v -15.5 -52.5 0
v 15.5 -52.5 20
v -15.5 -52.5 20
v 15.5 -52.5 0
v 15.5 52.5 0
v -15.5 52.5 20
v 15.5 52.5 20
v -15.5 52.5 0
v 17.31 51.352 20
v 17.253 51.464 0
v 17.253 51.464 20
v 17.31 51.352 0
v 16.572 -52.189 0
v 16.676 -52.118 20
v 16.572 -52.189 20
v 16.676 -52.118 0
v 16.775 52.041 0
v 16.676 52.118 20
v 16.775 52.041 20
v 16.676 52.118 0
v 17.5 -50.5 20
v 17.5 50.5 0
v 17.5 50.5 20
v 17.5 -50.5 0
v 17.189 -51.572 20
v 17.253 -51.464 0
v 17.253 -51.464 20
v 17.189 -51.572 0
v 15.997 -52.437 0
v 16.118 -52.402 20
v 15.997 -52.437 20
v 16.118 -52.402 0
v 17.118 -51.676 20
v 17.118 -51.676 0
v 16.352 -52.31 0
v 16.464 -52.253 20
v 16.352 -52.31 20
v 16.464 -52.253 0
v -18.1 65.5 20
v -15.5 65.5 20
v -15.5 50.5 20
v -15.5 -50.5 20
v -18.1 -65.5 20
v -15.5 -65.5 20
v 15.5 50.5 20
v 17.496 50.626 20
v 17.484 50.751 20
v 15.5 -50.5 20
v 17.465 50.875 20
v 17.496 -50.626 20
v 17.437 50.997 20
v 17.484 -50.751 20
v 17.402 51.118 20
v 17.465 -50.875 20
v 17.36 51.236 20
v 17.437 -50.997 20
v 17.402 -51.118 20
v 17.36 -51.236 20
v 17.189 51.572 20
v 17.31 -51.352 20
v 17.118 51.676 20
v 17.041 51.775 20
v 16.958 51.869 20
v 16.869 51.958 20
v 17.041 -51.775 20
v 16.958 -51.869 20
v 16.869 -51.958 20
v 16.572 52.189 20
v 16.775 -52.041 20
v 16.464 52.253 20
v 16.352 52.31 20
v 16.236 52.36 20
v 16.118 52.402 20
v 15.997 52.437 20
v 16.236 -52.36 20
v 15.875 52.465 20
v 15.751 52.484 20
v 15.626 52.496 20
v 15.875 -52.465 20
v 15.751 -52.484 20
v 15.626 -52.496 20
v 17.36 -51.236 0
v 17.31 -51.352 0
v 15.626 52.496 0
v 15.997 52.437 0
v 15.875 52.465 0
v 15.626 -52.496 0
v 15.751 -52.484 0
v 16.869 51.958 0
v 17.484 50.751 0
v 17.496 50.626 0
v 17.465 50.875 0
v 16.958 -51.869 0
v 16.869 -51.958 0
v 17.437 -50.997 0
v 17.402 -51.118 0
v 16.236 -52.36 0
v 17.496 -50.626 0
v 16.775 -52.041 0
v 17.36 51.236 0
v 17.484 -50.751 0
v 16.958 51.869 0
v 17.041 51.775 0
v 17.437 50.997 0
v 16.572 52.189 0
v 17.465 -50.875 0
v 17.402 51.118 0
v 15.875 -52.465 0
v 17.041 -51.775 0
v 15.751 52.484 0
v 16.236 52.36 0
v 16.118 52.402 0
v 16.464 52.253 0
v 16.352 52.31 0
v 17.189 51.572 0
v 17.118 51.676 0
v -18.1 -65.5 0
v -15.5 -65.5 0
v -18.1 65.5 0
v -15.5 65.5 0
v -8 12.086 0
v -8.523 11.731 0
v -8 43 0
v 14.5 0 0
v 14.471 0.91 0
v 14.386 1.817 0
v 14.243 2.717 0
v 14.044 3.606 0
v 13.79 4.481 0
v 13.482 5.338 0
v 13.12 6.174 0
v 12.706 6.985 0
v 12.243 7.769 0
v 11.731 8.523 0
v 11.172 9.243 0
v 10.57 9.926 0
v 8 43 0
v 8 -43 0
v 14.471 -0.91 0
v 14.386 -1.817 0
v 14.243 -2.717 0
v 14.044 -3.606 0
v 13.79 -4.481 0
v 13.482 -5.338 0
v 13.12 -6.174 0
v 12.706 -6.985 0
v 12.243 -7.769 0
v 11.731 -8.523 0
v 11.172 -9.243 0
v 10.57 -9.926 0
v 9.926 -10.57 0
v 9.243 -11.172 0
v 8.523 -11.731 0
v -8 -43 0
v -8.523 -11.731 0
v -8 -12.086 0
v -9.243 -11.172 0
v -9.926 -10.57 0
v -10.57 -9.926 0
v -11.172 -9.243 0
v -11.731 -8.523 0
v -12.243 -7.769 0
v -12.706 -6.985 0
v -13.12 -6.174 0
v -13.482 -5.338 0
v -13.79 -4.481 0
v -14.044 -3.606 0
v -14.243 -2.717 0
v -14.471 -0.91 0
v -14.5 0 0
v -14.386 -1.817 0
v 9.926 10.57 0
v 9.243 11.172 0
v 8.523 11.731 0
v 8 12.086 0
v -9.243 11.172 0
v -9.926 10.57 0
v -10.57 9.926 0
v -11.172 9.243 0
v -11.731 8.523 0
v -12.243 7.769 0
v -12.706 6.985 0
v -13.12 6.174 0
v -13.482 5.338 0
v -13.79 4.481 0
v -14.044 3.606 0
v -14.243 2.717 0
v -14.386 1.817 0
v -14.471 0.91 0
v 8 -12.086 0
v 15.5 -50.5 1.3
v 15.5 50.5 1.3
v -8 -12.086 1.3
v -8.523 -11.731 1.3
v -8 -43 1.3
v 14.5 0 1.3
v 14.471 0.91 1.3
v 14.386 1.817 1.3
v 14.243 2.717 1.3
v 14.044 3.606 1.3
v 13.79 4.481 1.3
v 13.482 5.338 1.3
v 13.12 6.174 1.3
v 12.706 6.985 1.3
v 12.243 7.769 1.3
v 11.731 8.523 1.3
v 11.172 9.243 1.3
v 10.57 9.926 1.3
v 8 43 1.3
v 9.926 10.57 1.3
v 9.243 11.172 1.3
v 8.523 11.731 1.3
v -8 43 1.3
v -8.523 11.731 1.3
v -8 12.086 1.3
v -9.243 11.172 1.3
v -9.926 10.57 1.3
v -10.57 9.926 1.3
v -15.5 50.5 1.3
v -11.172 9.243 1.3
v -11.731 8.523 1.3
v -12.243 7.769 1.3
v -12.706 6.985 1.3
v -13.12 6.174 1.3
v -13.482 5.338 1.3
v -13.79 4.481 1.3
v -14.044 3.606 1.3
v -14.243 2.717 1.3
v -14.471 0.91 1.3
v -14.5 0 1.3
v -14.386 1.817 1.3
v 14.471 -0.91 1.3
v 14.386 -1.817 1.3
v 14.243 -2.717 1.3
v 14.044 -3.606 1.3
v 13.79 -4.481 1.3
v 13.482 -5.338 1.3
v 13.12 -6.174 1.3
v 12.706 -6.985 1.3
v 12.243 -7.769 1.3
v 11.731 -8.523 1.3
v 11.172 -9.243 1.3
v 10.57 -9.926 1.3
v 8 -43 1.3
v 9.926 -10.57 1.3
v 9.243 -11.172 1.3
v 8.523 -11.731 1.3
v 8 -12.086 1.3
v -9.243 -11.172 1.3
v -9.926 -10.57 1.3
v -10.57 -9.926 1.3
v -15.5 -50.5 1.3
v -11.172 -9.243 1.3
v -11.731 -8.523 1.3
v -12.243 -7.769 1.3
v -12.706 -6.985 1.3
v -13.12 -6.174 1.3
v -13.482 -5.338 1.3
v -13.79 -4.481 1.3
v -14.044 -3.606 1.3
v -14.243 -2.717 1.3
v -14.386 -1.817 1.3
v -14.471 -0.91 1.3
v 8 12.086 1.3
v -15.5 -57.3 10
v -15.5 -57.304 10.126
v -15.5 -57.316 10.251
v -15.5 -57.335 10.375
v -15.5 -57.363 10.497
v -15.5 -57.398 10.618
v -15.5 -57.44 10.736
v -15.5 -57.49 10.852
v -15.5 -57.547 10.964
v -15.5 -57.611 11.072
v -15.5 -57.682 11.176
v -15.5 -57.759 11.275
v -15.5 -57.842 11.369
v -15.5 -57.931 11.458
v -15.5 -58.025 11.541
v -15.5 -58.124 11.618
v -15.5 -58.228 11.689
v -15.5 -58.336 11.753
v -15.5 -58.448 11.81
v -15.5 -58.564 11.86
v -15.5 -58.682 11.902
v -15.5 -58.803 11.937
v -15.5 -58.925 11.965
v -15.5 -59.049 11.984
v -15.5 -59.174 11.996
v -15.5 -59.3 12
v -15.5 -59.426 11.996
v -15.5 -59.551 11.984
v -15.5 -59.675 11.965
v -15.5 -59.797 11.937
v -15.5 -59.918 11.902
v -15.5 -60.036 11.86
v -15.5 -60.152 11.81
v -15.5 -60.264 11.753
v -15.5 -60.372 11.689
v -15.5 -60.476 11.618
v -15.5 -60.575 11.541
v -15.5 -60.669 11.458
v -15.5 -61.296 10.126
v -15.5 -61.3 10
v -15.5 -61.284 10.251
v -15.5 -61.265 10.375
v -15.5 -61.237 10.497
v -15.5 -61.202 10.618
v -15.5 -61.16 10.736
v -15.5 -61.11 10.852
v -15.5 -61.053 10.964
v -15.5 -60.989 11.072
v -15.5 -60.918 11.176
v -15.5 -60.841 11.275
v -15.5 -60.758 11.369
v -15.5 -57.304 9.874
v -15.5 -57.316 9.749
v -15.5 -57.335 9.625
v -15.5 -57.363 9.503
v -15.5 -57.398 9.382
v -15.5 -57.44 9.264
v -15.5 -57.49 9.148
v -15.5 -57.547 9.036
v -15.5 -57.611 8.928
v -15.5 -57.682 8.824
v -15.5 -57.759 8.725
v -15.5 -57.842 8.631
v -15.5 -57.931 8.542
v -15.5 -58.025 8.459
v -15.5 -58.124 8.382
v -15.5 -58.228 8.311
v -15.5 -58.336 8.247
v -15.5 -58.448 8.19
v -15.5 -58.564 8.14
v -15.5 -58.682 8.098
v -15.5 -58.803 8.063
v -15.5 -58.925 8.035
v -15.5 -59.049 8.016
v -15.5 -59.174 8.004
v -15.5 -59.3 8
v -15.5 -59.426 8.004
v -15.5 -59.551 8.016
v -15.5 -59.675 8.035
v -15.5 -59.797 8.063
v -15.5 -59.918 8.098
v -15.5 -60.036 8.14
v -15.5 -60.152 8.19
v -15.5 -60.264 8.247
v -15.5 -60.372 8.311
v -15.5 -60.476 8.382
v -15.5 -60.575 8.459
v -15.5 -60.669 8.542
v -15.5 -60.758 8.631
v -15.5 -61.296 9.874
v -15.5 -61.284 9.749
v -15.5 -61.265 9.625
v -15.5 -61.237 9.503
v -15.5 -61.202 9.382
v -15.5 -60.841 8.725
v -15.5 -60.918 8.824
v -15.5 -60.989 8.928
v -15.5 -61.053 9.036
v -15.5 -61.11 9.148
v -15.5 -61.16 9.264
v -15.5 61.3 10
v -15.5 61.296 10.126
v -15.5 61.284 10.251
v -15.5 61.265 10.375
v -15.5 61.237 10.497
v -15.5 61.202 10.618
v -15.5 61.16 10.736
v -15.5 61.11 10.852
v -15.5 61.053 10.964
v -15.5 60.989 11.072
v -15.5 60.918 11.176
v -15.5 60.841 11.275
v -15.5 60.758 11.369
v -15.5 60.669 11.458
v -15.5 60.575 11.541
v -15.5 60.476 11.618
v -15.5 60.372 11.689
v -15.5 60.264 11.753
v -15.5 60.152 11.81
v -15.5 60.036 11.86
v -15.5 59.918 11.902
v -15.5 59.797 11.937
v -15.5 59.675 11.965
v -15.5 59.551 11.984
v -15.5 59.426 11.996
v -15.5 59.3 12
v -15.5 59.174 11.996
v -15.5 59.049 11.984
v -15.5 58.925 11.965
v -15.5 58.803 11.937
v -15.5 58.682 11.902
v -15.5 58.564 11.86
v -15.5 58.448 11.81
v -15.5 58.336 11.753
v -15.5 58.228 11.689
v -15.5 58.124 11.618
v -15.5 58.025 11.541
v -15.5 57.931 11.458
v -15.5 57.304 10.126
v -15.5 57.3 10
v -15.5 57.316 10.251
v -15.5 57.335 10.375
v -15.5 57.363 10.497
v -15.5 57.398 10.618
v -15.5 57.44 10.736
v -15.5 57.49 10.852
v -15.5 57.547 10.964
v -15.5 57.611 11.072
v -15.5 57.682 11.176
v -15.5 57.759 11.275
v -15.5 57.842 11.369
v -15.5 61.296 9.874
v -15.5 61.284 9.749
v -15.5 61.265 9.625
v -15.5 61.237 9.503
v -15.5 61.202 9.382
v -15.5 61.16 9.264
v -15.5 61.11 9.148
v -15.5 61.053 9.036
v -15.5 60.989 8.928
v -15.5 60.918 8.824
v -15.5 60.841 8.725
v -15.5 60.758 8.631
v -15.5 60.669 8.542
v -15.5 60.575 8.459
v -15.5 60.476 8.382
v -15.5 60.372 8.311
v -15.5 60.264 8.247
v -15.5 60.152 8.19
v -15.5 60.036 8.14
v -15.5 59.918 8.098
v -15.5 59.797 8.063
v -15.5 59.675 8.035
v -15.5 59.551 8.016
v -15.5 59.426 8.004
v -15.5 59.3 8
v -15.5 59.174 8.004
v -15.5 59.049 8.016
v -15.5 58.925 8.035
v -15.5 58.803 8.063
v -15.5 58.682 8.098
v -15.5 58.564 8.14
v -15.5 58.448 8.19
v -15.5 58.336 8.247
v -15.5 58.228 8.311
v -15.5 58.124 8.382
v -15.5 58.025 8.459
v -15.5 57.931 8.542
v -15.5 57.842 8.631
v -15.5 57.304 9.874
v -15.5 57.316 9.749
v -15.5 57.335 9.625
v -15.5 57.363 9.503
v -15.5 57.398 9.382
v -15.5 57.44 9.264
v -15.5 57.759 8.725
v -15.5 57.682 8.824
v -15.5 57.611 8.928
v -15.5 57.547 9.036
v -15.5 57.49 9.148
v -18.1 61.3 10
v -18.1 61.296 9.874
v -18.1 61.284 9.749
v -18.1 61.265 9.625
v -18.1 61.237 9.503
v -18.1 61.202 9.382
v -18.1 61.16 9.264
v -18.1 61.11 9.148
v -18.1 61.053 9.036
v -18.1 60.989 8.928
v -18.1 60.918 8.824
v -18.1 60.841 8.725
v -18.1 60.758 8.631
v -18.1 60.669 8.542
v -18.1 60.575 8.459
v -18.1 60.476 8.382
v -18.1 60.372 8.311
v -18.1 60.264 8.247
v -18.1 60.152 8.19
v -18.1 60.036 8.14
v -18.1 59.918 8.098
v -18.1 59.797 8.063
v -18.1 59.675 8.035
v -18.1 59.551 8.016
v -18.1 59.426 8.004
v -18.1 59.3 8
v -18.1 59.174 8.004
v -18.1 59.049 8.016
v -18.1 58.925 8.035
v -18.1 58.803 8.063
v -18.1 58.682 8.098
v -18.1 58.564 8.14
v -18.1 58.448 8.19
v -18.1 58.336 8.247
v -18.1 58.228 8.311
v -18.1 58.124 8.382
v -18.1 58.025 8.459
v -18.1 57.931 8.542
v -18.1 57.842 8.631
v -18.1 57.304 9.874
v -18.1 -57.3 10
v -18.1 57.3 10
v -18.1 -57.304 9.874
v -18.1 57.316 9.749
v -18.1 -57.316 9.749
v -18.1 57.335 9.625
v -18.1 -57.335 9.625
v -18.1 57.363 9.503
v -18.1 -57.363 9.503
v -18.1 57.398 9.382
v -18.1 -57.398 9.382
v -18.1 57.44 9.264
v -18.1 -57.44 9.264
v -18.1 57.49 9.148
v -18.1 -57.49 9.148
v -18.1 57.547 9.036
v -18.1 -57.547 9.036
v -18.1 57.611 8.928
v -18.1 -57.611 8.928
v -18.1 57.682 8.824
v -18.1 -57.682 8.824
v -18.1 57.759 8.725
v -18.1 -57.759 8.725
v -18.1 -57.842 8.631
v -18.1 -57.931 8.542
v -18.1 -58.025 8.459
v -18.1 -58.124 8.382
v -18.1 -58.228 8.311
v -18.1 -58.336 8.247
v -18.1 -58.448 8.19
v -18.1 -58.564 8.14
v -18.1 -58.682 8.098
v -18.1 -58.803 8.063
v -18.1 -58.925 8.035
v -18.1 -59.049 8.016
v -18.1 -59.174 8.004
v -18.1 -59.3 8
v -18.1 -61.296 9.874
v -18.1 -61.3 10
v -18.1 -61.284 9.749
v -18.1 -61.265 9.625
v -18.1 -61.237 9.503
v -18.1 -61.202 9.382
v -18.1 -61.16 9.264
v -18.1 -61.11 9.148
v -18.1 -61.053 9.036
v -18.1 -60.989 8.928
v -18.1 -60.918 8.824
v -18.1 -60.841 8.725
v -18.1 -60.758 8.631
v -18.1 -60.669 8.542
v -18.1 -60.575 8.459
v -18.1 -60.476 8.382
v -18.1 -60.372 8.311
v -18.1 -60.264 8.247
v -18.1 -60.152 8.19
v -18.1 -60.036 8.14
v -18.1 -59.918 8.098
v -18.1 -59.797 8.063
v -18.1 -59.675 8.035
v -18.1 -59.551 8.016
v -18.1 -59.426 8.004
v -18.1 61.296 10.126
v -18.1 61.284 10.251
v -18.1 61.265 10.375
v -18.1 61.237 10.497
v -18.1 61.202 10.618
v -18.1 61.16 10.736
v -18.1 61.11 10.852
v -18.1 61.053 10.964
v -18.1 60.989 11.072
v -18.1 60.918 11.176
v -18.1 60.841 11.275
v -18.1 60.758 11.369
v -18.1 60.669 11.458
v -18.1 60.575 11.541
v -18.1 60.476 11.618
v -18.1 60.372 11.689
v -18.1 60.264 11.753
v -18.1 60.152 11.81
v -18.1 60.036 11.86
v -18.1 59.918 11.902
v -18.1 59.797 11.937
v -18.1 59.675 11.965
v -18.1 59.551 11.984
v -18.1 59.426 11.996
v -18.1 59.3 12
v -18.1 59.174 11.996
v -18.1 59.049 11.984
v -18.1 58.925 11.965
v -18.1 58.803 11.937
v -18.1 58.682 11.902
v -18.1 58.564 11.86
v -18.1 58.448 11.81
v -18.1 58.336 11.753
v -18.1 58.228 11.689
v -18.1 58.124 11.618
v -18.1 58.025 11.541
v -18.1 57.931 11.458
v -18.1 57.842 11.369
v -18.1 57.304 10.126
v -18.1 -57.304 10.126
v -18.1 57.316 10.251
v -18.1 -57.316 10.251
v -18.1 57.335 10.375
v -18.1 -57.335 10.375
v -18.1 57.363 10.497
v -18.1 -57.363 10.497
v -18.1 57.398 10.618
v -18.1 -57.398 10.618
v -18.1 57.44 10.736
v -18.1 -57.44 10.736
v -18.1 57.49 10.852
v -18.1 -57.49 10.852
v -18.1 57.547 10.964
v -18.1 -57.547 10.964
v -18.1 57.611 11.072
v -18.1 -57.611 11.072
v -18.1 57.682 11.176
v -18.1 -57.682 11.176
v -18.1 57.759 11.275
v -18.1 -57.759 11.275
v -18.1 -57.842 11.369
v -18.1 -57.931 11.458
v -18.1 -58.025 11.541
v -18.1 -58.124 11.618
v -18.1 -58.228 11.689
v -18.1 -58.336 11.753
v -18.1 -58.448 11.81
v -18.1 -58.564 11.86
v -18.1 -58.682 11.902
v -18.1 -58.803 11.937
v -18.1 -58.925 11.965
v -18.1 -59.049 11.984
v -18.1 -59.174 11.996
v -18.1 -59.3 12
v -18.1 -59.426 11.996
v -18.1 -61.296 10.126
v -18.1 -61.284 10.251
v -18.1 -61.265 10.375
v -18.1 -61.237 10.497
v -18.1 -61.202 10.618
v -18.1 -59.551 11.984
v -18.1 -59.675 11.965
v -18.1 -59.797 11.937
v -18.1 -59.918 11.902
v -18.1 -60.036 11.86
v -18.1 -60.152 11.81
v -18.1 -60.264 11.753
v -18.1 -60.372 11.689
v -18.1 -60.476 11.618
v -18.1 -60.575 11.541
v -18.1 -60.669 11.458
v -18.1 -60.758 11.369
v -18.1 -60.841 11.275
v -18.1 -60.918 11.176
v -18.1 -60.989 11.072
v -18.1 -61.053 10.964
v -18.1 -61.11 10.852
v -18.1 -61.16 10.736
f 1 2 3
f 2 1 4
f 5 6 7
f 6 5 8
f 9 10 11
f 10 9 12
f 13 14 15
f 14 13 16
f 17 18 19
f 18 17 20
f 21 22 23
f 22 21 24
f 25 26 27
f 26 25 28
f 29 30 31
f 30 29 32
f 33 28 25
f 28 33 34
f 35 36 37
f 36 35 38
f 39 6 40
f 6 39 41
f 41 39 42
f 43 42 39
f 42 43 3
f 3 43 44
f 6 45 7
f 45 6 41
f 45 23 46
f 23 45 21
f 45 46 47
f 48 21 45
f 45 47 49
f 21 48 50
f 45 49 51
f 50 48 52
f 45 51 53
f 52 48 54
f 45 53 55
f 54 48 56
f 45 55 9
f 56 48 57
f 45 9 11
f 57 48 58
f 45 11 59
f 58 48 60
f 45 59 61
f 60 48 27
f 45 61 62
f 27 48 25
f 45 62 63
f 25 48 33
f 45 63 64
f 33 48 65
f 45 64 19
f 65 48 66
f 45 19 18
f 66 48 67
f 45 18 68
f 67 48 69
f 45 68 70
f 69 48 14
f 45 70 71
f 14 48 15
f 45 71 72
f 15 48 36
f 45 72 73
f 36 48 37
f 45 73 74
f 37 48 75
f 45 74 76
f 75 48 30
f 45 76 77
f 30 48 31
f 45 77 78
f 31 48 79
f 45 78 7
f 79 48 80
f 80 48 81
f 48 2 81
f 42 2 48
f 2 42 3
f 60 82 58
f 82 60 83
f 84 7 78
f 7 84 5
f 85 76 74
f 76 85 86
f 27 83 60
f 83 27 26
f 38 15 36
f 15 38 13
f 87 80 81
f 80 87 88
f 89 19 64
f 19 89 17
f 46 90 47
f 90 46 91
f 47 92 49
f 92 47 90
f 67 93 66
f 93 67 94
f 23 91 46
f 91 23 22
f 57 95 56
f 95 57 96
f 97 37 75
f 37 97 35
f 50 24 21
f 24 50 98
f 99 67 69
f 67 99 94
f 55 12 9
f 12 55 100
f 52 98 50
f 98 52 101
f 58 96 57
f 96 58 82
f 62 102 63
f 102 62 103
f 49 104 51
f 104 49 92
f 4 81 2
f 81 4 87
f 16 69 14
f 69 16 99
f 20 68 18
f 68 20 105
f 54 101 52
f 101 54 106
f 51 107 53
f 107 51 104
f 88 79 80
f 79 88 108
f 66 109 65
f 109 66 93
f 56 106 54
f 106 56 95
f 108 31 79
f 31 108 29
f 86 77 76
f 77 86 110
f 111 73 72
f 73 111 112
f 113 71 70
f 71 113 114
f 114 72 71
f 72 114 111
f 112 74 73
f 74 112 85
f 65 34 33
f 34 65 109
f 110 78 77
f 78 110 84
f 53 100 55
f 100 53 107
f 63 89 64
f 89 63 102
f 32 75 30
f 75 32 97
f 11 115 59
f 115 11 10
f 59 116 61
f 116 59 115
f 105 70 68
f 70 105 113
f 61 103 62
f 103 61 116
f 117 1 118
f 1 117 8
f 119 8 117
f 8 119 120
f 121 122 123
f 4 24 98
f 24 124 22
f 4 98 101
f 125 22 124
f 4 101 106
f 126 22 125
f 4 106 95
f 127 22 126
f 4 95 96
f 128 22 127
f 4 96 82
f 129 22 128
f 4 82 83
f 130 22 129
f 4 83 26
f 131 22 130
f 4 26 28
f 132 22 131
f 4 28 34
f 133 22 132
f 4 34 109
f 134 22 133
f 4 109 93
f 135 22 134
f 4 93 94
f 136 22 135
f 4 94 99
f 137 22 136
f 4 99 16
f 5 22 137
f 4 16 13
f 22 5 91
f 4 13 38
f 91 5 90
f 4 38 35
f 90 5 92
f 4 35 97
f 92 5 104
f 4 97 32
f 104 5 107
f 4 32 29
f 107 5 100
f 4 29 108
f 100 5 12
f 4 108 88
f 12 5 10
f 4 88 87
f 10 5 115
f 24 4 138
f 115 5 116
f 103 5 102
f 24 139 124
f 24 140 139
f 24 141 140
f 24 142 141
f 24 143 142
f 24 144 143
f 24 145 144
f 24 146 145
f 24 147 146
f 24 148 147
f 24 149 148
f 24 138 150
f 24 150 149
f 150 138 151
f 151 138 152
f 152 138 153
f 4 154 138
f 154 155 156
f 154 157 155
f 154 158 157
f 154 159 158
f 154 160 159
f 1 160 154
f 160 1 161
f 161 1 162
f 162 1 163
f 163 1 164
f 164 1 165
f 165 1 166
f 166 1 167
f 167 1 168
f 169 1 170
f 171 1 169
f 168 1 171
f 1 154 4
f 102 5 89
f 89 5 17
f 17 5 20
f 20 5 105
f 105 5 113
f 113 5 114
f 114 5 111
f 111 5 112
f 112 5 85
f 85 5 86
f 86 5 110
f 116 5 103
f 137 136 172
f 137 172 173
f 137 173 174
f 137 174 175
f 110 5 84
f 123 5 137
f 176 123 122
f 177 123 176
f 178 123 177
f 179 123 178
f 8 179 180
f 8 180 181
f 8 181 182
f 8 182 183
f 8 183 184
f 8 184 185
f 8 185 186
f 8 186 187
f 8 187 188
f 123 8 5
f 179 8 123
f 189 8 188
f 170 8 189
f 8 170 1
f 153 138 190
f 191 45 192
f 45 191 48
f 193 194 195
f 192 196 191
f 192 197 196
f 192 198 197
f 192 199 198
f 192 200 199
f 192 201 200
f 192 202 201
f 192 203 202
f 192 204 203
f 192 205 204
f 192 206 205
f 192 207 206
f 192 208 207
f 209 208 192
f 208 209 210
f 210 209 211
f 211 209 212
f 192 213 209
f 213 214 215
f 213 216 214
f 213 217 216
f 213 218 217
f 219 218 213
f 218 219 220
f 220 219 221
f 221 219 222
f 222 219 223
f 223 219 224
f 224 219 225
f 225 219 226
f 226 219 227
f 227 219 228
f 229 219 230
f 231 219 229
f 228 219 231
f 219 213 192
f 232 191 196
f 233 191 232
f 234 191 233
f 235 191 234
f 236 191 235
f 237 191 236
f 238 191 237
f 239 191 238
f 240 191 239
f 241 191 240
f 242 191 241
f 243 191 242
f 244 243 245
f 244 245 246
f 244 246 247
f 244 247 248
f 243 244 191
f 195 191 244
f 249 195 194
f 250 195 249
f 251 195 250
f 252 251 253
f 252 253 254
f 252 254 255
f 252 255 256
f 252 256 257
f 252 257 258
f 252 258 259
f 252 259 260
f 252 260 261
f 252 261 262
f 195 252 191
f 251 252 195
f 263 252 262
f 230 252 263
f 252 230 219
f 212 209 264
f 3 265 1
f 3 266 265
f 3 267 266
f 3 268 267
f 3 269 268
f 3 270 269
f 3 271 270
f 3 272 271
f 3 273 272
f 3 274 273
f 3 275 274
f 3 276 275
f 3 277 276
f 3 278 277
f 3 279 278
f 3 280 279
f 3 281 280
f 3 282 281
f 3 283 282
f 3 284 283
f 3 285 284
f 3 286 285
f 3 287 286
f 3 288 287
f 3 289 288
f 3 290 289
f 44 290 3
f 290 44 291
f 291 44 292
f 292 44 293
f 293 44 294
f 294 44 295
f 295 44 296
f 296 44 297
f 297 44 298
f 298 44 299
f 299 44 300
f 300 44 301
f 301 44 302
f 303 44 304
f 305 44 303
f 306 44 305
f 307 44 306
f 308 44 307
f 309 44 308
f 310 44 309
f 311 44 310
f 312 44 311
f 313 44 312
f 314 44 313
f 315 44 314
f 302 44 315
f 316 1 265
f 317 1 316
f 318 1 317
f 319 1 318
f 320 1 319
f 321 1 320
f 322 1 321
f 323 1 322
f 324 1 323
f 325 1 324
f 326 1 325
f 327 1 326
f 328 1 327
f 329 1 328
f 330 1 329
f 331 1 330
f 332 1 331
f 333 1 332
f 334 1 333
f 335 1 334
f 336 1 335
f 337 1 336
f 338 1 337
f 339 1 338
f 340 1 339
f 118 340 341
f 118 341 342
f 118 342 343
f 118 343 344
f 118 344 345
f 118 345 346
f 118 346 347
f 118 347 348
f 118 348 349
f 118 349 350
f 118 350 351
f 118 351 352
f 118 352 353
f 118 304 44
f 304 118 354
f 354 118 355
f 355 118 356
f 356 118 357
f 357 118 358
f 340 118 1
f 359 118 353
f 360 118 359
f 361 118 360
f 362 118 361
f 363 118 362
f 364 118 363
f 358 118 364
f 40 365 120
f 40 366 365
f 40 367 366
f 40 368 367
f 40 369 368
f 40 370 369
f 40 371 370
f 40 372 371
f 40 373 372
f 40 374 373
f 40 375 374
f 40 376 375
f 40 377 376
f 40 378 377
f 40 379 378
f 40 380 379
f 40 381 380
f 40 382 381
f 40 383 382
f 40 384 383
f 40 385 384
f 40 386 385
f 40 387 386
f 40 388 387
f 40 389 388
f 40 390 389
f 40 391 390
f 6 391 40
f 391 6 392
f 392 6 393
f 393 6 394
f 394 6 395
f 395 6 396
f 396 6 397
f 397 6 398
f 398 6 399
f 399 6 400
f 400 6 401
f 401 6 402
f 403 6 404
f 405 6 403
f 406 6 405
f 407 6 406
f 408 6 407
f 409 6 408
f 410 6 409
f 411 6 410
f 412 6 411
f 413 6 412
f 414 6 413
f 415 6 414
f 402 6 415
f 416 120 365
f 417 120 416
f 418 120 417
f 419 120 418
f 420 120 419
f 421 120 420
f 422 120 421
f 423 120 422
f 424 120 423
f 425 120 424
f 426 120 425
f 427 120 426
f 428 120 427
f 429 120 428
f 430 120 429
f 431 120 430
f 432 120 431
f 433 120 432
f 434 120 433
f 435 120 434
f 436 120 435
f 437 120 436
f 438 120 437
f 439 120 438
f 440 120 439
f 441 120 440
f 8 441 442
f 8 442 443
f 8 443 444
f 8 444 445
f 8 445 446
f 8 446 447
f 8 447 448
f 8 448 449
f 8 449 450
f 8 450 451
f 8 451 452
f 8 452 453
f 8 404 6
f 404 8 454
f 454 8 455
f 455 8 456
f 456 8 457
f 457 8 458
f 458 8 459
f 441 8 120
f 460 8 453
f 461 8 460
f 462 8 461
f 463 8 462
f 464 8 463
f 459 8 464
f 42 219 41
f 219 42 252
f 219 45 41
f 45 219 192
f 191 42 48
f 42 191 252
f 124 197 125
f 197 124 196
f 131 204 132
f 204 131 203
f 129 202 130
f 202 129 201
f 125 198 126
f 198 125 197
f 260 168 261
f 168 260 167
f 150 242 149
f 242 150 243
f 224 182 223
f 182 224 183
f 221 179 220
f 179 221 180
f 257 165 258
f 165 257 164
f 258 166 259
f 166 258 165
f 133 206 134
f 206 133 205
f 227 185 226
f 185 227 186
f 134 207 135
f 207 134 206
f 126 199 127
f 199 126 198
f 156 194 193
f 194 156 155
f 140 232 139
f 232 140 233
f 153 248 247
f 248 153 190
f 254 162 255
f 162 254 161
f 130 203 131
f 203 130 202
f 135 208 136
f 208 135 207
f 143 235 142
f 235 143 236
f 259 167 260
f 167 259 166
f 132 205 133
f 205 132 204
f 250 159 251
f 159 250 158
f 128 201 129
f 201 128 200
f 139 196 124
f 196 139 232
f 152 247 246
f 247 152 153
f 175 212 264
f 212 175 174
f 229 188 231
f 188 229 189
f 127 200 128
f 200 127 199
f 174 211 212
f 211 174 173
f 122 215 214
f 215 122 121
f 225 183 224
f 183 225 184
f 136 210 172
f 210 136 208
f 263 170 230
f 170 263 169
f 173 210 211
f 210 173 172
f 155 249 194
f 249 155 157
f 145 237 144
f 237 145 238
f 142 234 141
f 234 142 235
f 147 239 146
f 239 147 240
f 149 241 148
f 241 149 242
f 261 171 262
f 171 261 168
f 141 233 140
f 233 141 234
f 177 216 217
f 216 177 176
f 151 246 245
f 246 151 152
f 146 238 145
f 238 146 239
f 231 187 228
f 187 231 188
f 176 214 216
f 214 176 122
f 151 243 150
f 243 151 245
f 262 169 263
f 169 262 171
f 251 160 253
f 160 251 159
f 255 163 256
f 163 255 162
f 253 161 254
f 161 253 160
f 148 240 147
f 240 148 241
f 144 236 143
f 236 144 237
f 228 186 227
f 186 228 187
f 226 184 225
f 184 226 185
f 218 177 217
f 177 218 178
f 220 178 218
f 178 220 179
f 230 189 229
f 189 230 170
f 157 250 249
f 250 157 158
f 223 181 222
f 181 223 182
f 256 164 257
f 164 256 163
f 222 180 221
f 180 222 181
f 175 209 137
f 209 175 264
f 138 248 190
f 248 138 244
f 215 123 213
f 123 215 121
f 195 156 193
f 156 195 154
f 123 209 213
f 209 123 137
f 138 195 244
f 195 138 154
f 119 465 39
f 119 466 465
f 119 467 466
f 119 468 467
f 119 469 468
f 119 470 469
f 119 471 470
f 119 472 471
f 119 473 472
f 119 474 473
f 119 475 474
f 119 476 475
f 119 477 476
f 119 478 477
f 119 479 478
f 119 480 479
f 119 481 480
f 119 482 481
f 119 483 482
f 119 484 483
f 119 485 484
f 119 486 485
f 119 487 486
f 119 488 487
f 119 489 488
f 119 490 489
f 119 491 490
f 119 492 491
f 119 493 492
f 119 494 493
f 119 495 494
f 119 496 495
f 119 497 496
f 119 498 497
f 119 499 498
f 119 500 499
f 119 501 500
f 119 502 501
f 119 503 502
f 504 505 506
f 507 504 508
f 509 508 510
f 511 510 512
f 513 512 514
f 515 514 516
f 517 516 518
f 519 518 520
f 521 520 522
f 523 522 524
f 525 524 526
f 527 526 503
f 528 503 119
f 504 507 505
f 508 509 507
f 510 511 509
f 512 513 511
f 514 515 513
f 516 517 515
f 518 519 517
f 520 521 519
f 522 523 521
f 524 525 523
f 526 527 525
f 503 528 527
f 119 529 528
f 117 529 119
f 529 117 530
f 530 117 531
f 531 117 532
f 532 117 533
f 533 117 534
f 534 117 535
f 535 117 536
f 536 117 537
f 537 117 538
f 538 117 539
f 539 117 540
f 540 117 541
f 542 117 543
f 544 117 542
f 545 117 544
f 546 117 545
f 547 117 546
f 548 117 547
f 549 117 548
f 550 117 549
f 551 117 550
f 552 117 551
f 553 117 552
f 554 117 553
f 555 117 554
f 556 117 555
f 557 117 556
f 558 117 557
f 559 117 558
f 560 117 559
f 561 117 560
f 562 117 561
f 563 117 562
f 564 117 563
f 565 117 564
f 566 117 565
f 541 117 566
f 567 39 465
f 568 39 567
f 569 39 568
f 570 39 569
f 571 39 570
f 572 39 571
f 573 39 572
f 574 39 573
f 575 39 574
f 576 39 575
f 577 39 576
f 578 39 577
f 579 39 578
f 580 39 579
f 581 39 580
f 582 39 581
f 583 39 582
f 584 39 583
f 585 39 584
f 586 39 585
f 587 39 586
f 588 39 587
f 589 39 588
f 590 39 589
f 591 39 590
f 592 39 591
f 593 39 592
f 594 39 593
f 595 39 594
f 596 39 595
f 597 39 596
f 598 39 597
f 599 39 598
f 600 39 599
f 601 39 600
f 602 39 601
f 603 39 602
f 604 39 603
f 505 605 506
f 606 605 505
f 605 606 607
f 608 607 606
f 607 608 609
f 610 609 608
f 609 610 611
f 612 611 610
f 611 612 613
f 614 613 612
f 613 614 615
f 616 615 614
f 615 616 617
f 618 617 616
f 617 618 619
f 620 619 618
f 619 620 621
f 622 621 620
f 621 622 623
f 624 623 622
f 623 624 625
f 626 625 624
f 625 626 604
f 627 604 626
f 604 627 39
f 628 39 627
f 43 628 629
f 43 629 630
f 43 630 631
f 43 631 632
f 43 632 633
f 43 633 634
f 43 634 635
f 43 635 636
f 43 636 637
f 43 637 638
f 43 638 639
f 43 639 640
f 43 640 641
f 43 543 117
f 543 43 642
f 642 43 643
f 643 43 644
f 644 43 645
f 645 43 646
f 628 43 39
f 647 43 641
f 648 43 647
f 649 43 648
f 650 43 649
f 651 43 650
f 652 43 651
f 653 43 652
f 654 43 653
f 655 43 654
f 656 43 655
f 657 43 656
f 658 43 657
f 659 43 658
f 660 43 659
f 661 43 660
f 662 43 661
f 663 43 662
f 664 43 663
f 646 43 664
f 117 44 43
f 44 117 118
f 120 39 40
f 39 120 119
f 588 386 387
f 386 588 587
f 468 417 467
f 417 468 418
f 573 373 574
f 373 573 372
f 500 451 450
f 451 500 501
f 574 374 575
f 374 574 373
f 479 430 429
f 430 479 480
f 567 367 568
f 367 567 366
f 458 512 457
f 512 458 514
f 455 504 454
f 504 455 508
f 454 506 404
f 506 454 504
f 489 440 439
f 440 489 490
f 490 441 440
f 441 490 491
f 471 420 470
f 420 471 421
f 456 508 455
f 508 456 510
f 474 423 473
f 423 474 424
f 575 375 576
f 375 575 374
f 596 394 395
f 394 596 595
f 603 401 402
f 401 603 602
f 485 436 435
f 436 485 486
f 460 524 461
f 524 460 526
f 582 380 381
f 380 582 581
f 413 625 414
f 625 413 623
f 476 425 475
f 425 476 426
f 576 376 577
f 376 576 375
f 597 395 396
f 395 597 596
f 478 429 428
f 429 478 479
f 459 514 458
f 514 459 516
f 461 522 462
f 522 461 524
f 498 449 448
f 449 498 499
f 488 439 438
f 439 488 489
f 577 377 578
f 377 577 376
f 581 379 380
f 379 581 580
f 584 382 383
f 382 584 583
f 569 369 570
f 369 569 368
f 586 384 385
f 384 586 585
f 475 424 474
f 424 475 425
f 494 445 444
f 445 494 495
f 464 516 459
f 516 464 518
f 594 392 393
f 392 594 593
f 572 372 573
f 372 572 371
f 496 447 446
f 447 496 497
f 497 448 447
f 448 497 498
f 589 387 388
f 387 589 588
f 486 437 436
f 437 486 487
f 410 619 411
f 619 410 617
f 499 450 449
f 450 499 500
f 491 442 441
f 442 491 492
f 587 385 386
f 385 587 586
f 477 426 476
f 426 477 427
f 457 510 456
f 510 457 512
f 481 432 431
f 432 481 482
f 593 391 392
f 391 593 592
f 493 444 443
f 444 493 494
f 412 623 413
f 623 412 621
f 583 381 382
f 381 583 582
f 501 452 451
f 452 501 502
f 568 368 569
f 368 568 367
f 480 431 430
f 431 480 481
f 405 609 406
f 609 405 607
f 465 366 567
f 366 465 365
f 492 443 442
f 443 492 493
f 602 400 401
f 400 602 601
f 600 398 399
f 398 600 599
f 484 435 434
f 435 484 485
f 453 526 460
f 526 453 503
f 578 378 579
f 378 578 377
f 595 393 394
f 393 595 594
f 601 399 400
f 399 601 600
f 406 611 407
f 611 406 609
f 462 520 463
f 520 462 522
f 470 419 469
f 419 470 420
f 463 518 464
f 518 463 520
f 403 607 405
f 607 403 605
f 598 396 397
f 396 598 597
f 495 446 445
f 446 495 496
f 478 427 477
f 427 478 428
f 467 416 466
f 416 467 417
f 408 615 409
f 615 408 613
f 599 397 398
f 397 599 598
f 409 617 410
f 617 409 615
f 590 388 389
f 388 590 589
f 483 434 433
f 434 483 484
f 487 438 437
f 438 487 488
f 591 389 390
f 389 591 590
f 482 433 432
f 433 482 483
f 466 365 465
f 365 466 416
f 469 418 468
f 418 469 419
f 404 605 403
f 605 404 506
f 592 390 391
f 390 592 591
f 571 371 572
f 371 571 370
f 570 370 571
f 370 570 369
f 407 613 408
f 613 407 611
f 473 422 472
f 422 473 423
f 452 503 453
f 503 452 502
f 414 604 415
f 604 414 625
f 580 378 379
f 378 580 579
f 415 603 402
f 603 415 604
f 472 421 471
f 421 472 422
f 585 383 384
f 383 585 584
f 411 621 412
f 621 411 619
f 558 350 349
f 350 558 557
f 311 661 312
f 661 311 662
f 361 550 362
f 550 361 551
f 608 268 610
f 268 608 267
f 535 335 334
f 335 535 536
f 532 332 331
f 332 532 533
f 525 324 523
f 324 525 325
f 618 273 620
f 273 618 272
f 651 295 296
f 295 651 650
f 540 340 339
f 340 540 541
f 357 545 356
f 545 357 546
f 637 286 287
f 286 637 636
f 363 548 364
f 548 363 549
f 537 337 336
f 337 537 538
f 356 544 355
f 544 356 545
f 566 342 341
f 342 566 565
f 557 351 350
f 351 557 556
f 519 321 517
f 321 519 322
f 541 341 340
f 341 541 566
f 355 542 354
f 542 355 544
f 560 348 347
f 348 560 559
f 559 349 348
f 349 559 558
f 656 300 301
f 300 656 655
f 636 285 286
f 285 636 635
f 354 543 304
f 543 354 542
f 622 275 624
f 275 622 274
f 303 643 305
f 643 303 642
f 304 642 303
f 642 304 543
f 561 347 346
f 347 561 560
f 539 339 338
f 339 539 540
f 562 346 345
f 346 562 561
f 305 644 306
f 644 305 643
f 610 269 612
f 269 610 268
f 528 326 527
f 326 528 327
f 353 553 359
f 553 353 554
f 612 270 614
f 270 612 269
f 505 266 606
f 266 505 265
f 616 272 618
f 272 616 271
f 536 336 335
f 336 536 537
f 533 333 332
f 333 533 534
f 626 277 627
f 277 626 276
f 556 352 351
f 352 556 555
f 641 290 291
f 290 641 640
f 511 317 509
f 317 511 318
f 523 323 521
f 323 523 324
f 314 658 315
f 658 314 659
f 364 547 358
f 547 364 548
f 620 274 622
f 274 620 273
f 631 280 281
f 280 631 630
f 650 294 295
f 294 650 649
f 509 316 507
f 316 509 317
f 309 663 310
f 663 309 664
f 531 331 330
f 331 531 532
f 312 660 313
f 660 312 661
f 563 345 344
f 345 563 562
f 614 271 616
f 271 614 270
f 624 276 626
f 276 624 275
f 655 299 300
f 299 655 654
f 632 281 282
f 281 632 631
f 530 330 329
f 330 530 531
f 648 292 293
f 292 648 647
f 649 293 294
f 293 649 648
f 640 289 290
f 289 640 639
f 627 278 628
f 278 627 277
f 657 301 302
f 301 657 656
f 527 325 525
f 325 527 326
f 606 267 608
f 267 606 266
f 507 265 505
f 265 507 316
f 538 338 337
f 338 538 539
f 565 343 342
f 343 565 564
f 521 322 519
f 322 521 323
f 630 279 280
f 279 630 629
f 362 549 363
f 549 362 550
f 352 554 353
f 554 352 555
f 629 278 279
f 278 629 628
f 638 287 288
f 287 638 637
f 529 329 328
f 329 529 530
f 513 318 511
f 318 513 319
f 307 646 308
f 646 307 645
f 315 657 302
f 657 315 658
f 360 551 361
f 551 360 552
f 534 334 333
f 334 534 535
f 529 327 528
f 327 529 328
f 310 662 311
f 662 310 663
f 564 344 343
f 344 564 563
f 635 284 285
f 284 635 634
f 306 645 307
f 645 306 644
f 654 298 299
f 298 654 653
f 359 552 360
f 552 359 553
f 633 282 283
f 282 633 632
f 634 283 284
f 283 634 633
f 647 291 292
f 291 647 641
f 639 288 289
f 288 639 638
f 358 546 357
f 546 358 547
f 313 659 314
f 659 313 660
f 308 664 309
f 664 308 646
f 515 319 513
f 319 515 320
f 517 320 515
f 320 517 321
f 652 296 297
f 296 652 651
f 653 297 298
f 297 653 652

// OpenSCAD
$fn=100;
w_border=15;
module holder(
  height=31, // the height of the powerstrip
  width=101, // the width of the powerstrip
  window_border=15, // 
  socket_depth=20,
  th=2.6,
  flap=15,
  screw_d=4
  ) {
    window_w=width-w_border;
    window_h=height-w_border;
    difference() { // powerstrip casing
        hull() {
            translate([-height/2,-width/2,0]) cylinder(h=socket_depth,r=2);
            translate([height/2,-width/2,0]) cylinder(h=socket_depth,r=2);
            translate([height/2,width/2,0]) cylinder(h=socket_depth,r=2);
            translate([-height/2,width/2,0]) cylinder(h=socket_depth,r=2);
        }
        translate([0,0,socket_depth/2+th/2]) cube([height,width,socket_depth],true);
        cylinder(h=th,d=29);
        cube([window_h,window_w,th],true);
    }
    difference() { //screw base
        // TODO make this a hull
        translate([-height/2-th,width/2+flap,0]) rotate([90,0,0]) cube([th,socket_depth,width+flap*2]);
        translate([-height/2-th,width/2+flap/2+th/2,socket_depth/2]) rotate([0,90,0]) cylinder(h=10*th,d=4);
        translate([-height/2-th,-width/2-flap/2-th/2,socket_depth/2]) rotate([0,90,0]) cylinder(h=10*th,d=4);
    }
}
holder();
